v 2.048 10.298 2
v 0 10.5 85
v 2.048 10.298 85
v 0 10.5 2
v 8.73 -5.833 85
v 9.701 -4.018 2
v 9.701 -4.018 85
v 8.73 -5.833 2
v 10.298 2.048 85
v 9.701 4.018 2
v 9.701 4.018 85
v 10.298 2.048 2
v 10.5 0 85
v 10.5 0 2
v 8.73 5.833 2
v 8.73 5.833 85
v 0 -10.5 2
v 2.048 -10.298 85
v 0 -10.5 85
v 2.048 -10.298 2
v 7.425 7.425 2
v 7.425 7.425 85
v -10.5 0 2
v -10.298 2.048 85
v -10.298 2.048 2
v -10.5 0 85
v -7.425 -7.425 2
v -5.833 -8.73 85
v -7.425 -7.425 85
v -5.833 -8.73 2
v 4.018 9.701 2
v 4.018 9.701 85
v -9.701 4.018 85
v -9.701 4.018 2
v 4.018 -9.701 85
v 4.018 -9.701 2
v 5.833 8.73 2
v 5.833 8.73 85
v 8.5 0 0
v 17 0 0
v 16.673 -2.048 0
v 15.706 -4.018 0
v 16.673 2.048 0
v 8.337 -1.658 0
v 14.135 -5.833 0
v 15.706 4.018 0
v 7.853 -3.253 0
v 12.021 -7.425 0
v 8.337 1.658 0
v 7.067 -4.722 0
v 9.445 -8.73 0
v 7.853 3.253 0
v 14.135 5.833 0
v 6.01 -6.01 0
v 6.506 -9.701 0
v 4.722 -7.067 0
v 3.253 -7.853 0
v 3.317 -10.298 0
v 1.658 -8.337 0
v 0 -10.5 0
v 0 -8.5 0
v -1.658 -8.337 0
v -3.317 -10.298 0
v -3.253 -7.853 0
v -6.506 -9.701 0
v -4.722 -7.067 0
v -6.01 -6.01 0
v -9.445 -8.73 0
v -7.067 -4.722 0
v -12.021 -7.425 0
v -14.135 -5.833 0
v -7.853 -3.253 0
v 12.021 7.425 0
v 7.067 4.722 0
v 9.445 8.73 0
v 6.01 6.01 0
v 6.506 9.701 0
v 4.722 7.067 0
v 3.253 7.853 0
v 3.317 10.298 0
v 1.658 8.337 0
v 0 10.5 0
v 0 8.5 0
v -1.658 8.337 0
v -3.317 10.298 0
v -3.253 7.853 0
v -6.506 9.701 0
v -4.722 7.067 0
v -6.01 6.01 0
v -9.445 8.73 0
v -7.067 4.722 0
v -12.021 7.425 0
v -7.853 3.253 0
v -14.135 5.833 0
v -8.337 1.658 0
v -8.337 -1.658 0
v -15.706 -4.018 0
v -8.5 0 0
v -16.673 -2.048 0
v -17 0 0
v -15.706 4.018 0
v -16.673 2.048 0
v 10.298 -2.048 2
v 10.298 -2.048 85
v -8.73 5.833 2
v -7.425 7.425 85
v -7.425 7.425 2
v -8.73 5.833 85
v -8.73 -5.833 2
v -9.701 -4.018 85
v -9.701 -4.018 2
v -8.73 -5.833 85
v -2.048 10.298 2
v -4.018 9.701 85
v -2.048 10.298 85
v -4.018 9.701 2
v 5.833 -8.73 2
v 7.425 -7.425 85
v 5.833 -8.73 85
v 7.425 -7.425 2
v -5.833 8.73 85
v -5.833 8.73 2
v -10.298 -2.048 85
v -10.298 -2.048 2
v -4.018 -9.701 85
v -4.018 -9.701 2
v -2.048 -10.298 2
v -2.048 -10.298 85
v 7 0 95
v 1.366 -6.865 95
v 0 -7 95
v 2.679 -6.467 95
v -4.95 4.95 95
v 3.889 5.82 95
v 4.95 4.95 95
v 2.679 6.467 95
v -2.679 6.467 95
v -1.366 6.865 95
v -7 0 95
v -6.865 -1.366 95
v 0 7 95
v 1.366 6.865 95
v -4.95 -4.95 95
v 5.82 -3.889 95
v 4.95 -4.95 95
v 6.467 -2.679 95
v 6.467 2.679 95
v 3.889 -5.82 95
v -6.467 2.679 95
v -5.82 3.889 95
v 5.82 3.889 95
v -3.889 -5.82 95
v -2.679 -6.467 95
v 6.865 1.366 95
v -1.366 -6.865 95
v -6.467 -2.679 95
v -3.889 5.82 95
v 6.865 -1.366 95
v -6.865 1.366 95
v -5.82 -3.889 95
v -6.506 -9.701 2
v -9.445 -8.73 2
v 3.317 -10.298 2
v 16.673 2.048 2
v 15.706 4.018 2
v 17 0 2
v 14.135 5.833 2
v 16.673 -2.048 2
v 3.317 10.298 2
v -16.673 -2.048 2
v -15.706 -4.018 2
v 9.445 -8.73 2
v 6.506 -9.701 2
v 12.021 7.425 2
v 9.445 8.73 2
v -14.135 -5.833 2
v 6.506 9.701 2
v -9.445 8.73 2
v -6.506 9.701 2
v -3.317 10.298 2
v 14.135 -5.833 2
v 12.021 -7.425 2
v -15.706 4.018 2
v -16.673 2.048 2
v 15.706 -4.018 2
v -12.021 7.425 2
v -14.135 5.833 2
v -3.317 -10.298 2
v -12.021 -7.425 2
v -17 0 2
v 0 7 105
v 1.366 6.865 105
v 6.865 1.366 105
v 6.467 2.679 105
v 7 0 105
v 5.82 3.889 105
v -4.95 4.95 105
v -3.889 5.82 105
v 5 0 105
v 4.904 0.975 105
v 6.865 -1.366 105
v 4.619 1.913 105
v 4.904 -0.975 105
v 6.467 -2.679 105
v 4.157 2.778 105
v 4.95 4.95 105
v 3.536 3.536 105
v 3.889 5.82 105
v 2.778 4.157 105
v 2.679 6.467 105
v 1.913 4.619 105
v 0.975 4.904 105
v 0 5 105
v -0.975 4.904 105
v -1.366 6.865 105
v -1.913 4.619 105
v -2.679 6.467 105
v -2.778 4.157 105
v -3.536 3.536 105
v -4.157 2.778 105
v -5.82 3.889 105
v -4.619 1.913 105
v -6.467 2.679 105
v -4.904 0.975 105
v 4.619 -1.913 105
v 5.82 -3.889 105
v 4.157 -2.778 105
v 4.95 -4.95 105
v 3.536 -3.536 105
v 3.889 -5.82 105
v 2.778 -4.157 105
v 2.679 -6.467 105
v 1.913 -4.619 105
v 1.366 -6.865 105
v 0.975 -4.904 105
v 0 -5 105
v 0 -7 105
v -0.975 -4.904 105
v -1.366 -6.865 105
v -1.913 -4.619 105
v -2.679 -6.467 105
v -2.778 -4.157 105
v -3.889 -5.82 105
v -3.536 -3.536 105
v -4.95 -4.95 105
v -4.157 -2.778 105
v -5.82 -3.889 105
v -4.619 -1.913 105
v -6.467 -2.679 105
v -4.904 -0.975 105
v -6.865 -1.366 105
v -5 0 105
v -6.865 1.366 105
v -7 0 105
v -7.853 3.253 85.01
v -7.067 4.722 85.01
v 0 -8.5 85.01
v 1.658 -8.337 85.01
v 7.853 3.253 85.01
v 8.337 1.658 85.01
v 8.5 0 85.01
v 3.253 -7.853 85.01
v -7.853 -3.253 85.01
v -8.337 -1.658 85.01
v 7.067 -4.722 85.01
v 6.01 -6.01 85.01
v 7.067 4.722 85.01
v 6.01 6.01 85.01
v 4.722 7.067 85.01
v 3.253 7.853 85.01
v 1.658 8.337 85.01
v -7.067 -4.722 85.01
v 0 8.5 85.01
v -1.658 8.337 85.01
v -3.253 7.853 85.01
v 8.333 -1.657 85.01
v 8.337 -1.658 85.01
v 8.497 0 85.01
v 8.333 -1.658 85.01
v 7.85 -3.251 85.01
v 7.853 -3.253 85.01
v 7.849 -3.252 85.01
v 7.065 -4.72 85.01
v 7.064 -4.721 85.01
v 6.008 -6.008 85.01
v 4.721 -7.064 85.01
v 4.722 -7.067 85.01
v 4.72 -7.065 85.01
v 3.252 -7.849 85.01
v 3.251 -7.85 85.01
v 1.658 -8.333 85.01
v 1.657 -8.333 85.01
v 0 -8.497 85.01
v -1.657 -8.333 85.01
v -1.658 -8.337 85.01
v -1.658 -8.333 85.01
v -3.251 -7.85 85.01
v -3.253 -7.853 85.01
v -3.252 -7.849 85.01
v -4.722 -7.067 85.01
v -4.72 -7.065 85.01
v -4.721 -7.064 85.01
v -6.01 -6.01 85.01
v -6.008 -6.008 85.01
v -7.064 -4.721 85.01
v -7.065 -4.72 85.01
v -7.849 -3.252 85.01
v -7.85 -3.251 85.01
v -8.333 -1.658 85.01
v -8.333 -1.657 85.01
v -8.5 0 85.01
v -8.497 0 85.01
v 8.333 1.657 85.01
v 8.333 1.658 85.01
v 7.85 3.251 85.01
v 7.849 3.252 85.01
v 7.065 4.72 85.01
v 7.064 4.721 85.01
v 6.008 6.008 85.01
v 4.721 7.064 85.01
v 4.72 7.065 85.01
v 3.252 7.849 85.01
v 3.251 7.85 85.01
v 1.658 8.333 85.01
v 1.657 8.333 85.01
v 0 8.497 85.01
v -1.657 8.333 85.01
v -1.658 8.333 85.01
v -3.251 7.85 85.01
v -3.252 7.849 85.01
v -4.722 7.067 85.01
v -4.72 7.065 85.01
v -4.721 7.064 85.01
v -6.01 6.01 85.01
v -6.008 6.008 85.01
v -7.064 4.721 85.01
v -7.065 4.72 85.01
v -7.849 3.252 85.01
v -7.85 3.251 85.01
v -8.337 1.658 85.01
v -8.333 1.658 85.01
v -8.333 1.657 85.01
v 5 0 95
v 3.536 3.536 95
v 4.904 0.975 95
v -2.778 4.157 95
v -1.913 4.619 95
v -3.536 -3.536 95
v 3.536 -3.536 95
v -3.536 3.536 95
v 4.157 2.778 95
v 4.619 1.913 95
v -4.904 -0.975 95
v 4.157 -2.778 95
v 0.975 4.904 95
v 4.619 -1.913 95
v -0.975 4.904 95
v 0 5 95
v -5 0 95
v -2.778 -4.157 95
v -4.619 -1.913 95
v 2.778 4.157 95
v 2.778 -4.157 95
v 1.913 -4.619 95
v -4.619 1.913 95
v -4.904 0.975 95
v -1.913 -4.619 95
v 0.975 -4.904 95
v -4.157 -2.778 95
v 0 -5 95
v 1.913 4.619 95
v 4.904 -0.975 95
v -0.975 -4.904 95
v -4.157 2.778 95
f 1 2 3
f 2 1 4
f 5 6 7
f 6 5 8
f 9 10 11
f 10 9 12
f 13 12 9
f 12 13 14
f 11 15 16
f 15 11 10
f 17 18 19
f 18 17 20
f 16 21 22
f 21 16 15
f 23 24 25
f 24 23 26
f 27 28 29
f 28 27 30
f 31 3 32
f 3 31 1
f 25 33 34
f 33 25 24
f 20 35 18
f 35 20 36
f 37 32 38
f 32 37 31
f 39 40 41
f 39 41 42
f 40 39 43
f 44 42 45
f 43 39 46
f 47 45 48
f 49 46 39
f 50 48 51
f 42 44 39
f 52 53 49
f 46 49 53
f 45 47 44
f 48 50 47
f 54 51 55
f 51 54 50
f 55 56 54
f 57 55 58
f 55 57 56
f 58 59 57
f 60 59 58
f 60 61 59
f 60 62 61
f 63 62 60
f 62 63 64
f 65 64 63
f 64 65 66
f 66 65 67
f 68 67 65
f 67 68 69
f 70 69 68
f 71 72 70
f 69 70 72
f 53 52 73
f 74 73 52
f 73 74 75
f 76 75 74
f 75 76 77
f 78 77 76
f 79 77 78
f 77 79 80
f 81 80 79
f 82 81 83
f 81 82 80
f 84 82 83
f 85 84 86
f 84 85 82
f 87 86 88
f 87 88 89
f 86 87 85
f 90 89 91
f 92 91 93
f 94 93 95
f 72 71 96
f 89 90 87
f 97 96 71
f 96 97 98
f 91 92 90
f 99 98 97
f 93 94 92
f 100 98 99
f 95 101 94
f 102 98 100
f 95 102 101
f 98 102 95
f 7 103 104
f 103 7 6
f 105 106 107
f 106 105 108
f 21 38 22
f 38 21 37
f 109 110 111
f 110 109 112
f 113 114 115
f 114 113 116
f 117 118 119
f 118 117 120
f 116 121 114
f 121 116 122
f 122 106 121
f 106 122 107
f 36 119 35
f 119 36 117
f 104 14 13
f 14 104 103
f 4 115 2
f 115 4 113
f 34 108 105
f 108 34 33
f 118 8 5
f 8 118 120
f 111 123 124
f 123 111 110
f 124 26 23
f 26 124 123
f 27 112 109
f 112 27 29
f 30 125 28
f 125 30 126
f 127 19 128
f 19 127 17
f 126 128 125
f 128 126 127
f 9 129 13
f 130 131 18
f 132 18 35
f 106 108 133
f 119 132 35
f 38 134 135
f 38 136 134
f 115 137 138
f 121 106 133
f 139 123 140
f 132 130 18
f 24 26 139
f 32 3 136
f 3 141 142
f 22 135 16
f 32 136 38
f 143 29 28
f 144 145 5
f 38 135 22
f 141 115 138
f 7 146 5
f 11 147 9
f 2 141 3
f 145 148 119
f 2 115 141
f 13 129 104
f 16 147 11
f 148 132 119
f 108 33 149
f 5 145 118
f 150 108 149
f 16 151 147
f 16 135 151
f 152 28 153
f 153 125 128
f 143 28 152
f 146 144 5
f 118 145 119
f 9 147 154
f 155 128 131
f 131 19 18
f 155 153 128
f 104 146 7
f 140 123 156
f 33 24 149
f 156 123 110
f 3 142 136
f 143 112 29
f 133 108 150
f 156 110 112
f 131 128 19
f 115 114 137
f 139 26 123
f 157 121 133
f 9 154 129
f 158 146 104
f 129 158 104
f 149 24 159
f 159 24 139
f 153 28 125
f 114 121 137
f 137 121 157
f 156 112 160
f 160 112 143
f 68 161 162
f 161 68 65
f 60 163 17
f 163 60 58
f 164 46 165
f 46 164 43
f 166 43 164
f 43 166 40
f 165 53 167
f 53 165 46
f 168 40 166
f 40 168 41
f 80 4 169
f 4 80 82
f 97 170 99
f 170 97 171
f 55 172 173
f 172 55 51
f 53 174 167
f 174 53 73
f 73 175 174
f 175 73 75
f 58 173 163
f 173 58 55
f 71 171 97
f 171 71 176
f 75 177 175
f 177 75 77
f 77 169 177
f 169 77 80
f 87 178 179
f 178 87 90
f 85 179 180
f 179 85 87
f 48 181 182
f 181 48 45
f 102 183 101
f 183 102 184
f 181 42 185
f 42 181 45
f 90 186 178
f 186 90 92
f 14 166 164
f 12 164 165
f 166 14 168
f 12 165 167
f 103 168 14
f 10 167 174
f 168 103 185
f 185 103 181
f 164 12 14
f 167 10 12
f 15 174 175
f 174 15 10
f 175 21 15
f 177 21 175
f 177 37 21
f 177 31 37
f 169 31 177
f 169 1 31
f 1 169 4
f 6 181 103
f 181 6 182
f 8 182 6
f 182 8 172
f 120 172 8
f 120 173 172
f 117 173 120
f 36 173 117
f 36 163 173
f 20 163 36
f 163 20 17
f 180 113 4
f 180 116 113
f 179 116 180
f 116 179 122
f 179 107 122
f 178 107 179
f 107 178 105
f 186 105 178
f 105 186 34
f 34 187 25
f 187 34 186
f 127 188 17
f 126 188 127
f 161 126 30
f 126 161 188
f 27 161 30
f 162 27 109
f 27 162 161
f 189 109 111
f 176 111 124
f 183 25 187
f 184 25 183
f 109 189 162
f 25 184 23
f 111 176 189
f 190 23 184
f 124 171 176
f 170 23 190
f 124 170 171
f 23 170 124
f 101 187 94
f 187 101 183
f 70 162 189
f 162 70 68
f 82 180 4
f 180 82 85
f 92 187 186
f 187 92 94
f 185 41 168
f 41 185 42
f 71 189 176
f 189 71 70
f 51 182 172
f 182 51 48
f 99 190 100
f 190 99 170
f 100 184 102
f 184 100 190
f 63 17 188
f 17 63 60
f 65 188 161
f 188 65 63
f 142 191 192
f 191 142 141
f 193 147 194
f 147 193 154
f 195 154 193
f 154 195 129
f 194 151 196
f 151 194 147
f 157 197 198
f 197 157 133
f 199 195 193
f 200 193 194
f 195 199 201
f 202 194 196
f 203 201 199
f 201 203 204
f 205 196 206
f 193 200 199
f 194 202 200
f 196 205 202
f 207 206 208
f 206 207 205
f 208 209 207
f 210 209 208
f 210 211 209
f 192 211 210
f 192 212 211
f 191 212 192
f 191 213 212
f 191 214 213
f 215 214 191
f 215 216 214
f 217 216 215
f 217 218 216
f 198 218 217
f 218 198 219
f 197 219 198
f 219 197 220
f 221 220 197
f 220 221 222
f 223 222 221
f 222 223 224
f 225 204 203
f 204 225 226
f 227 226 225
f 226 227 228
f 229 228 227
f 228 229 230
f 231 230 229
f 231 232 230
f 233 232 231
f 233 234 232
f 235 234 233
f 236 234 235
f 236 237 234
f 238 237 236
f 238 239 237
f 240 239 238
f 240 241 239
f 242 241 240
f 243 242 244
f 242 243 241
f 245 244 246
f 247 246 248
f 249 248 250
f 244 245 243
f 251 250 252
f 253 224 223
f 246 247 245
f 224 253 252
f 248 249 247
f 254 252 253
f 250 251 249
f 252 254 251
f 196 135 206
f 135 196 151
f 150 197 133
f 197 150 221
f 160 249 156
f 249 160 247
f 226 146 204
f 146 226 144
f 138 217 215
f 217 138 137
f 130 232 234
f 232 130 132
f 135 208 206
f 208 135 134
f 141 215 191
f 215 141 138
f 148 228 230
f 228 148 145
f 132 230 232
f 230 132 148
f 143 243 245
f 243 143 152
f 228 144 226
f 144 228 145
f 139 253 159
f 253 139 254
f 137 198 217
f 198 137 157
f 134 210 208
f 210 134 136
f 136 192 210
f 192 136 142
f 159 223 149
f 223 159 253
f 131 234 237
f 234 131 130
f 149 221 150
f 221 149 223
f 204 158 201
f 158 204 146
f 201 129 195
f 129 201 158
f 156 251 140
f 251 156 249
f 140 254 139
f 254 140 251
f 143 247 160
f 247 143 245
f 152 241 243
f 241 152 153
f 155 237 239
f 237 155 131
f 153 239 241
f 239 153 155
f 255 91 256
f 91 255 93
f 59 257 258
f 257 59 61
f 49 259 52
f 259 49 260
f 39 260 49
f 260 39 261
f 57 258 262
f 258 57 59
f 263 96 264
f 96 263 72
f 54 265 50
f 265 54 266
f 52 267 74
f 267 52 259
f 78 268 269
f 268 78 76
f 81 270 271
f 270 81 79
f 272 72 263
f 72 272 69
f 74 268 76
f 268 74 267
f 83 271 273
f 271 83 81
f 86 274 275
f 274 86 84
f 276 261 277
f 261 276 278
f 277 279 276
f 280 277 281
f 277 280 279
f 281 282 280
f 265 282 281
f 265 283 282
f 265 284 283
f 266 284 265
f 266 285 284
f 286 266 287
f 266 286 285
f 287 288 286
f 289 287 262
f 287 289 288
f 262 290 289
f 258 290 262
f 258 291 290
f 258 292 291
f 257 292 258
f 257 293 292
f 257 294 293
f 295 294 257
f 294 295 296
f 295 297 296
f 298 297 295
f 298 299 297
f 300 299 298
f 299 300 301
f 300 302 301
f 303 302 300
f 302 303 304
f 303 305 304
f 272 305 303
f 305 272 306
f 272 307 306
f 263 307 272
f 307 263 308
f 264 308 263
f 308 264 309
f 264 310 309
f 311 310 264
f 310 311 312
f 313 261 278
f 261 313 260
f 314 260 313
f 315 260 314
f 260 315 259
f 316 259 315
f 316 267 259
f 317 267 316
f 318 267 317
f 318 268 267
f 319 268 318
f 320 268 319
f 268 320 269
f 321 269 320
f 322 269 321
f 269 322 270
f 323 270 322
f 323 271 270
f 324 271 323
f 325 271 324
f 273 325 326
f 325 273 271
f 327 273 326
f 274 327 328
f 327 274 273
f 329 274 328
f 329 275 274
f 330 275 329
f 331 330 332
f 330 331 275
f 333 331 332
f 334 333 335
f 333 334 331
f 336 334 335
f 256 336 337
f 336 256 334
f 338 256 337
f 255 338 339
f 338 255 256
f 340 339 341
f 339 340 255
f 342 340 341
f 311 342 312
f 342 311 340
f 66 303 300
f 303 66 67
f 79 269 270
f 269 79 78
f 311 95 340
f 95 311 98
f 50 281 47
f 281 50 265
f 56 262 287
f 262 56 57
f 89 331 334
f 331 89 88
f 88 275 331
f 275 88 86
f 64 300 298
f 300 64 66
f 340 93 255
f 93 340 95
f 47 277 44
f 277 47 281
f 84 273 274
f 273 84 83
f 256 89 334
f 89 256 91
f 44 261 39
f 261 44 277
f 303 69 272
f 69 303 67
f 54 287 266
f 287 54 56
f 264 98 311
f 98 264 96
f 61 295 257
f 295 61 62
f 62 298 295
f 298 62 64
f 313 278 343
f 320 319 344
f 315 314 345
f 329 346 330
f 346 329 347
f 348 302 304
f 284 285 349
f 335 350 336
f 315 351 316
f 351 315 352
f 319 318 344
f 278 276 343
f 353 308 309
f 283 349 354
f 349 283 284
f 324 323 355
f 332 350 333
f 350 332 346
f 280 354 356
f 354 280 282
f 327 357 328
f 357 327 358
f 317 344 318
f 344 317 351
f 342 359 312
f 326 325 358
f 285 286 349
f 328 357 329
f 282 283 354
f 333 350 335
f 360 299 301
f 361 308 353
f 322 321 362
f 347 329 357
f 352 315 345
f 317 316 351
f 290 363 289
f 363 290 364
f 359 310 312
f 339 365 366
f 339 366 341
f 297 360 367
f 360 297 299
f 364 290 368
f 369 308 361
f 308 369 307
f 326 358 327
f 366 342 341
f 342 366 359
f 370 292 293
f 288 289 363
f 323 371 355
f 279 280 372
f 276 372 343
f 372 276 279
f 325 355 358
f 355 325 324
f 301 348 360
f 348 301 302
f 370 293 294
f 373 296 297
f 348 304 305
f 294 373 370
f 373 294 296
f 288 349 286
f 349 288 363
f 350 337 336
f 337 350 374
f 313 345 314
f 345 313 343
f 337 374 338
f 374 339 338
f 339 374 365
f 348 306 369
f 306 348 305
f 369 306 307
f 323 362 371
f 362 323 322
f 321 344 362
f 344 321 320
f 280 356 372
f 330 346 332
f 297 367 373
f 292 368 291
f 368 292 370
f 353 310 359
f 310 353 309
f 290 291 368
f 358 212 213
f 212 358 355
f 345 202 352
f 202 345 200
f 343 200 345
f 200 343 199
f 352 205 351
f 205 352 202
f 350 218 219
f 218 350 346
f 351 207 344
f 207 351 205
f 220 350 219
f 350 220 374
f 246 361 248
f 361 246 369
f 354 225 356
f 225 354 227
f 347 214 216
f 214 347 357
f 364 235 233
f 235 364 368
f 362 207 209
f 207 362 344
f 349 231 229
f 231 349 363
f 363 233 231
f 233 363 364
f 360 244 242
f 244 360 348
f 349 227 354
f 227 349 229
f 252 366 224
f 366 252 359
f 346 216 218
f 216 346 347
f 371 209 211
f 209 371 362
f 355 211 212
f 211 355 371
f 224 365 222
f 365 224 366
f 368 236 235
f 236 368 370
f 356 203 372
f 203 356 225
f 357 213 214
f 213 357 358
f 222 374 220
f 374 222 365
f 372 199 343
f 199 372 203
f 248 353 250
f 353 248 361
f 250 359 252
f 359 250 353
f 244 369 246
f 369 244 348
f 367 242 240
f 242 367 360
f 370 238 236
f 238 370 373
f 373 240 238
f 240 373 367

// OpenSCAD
/*
 * Assistance to medical research testing placebo
 * effect of the contents of a generalized syringe.
 *
 * The cover can be fitted to a specific syringe
 * according to the following diagram (units in mm):
 *
 *                t1
 *                v
 *               _
 * h1 -> {      | |
 *       {      |=|
 *             / ^ \     } <- h2
 *       {    | d1  |
 *       {    |     |
 *       {    |=====|
 * h3 -> {    |  ^  |
 *       {    | d2  |
 *       {   _|_____|_
 *       {  |_________|  } <- t2
 *          ===========
 *               ^
 *              d3
 */

     // mm
h1 = 10;
h2 = 10;
h3 = 85;

d1 = 10;
d2 = 17;
d3 = 34;

t1 = 2;
t2 = 2;


$fn = 32; // fragments


//------------------------------------//
//--SPECIALIZE-COVER-ABOVE-THIS-LINE--//
//------------------------------------//


let (t3 = (2*t1))
difference()
{

union()
{
    union()
    {
        translate([0, 0, 0])
        {
            cylinder(h3, d=d2+t3);
        };
        translate([0, 0, h3])
        {
            cylinder(h2, d1=d2+t3, d2=d1+t3);
        };
    };
    union()
    {
        resize([d3])
        {
            cylinder(t2, d=d2+t3);
        };
        translate([0, 0, h3+h2])
        {
            cylinder(h1, d=d1+t3);
        };
    };
};

union()
{
    union()
    {
        translate([0, 0, -1])
        {
            cylinder(h3+1.01, d=d2);
        };
        translate([0, 0, h3])
        {
            cylinder(h2, d1=d2, d2=d1);
        };
    };
    translate([0, 0, h3+h2-1])
    {
        cylinder(h1+2, d=d1);
    };
};

};
